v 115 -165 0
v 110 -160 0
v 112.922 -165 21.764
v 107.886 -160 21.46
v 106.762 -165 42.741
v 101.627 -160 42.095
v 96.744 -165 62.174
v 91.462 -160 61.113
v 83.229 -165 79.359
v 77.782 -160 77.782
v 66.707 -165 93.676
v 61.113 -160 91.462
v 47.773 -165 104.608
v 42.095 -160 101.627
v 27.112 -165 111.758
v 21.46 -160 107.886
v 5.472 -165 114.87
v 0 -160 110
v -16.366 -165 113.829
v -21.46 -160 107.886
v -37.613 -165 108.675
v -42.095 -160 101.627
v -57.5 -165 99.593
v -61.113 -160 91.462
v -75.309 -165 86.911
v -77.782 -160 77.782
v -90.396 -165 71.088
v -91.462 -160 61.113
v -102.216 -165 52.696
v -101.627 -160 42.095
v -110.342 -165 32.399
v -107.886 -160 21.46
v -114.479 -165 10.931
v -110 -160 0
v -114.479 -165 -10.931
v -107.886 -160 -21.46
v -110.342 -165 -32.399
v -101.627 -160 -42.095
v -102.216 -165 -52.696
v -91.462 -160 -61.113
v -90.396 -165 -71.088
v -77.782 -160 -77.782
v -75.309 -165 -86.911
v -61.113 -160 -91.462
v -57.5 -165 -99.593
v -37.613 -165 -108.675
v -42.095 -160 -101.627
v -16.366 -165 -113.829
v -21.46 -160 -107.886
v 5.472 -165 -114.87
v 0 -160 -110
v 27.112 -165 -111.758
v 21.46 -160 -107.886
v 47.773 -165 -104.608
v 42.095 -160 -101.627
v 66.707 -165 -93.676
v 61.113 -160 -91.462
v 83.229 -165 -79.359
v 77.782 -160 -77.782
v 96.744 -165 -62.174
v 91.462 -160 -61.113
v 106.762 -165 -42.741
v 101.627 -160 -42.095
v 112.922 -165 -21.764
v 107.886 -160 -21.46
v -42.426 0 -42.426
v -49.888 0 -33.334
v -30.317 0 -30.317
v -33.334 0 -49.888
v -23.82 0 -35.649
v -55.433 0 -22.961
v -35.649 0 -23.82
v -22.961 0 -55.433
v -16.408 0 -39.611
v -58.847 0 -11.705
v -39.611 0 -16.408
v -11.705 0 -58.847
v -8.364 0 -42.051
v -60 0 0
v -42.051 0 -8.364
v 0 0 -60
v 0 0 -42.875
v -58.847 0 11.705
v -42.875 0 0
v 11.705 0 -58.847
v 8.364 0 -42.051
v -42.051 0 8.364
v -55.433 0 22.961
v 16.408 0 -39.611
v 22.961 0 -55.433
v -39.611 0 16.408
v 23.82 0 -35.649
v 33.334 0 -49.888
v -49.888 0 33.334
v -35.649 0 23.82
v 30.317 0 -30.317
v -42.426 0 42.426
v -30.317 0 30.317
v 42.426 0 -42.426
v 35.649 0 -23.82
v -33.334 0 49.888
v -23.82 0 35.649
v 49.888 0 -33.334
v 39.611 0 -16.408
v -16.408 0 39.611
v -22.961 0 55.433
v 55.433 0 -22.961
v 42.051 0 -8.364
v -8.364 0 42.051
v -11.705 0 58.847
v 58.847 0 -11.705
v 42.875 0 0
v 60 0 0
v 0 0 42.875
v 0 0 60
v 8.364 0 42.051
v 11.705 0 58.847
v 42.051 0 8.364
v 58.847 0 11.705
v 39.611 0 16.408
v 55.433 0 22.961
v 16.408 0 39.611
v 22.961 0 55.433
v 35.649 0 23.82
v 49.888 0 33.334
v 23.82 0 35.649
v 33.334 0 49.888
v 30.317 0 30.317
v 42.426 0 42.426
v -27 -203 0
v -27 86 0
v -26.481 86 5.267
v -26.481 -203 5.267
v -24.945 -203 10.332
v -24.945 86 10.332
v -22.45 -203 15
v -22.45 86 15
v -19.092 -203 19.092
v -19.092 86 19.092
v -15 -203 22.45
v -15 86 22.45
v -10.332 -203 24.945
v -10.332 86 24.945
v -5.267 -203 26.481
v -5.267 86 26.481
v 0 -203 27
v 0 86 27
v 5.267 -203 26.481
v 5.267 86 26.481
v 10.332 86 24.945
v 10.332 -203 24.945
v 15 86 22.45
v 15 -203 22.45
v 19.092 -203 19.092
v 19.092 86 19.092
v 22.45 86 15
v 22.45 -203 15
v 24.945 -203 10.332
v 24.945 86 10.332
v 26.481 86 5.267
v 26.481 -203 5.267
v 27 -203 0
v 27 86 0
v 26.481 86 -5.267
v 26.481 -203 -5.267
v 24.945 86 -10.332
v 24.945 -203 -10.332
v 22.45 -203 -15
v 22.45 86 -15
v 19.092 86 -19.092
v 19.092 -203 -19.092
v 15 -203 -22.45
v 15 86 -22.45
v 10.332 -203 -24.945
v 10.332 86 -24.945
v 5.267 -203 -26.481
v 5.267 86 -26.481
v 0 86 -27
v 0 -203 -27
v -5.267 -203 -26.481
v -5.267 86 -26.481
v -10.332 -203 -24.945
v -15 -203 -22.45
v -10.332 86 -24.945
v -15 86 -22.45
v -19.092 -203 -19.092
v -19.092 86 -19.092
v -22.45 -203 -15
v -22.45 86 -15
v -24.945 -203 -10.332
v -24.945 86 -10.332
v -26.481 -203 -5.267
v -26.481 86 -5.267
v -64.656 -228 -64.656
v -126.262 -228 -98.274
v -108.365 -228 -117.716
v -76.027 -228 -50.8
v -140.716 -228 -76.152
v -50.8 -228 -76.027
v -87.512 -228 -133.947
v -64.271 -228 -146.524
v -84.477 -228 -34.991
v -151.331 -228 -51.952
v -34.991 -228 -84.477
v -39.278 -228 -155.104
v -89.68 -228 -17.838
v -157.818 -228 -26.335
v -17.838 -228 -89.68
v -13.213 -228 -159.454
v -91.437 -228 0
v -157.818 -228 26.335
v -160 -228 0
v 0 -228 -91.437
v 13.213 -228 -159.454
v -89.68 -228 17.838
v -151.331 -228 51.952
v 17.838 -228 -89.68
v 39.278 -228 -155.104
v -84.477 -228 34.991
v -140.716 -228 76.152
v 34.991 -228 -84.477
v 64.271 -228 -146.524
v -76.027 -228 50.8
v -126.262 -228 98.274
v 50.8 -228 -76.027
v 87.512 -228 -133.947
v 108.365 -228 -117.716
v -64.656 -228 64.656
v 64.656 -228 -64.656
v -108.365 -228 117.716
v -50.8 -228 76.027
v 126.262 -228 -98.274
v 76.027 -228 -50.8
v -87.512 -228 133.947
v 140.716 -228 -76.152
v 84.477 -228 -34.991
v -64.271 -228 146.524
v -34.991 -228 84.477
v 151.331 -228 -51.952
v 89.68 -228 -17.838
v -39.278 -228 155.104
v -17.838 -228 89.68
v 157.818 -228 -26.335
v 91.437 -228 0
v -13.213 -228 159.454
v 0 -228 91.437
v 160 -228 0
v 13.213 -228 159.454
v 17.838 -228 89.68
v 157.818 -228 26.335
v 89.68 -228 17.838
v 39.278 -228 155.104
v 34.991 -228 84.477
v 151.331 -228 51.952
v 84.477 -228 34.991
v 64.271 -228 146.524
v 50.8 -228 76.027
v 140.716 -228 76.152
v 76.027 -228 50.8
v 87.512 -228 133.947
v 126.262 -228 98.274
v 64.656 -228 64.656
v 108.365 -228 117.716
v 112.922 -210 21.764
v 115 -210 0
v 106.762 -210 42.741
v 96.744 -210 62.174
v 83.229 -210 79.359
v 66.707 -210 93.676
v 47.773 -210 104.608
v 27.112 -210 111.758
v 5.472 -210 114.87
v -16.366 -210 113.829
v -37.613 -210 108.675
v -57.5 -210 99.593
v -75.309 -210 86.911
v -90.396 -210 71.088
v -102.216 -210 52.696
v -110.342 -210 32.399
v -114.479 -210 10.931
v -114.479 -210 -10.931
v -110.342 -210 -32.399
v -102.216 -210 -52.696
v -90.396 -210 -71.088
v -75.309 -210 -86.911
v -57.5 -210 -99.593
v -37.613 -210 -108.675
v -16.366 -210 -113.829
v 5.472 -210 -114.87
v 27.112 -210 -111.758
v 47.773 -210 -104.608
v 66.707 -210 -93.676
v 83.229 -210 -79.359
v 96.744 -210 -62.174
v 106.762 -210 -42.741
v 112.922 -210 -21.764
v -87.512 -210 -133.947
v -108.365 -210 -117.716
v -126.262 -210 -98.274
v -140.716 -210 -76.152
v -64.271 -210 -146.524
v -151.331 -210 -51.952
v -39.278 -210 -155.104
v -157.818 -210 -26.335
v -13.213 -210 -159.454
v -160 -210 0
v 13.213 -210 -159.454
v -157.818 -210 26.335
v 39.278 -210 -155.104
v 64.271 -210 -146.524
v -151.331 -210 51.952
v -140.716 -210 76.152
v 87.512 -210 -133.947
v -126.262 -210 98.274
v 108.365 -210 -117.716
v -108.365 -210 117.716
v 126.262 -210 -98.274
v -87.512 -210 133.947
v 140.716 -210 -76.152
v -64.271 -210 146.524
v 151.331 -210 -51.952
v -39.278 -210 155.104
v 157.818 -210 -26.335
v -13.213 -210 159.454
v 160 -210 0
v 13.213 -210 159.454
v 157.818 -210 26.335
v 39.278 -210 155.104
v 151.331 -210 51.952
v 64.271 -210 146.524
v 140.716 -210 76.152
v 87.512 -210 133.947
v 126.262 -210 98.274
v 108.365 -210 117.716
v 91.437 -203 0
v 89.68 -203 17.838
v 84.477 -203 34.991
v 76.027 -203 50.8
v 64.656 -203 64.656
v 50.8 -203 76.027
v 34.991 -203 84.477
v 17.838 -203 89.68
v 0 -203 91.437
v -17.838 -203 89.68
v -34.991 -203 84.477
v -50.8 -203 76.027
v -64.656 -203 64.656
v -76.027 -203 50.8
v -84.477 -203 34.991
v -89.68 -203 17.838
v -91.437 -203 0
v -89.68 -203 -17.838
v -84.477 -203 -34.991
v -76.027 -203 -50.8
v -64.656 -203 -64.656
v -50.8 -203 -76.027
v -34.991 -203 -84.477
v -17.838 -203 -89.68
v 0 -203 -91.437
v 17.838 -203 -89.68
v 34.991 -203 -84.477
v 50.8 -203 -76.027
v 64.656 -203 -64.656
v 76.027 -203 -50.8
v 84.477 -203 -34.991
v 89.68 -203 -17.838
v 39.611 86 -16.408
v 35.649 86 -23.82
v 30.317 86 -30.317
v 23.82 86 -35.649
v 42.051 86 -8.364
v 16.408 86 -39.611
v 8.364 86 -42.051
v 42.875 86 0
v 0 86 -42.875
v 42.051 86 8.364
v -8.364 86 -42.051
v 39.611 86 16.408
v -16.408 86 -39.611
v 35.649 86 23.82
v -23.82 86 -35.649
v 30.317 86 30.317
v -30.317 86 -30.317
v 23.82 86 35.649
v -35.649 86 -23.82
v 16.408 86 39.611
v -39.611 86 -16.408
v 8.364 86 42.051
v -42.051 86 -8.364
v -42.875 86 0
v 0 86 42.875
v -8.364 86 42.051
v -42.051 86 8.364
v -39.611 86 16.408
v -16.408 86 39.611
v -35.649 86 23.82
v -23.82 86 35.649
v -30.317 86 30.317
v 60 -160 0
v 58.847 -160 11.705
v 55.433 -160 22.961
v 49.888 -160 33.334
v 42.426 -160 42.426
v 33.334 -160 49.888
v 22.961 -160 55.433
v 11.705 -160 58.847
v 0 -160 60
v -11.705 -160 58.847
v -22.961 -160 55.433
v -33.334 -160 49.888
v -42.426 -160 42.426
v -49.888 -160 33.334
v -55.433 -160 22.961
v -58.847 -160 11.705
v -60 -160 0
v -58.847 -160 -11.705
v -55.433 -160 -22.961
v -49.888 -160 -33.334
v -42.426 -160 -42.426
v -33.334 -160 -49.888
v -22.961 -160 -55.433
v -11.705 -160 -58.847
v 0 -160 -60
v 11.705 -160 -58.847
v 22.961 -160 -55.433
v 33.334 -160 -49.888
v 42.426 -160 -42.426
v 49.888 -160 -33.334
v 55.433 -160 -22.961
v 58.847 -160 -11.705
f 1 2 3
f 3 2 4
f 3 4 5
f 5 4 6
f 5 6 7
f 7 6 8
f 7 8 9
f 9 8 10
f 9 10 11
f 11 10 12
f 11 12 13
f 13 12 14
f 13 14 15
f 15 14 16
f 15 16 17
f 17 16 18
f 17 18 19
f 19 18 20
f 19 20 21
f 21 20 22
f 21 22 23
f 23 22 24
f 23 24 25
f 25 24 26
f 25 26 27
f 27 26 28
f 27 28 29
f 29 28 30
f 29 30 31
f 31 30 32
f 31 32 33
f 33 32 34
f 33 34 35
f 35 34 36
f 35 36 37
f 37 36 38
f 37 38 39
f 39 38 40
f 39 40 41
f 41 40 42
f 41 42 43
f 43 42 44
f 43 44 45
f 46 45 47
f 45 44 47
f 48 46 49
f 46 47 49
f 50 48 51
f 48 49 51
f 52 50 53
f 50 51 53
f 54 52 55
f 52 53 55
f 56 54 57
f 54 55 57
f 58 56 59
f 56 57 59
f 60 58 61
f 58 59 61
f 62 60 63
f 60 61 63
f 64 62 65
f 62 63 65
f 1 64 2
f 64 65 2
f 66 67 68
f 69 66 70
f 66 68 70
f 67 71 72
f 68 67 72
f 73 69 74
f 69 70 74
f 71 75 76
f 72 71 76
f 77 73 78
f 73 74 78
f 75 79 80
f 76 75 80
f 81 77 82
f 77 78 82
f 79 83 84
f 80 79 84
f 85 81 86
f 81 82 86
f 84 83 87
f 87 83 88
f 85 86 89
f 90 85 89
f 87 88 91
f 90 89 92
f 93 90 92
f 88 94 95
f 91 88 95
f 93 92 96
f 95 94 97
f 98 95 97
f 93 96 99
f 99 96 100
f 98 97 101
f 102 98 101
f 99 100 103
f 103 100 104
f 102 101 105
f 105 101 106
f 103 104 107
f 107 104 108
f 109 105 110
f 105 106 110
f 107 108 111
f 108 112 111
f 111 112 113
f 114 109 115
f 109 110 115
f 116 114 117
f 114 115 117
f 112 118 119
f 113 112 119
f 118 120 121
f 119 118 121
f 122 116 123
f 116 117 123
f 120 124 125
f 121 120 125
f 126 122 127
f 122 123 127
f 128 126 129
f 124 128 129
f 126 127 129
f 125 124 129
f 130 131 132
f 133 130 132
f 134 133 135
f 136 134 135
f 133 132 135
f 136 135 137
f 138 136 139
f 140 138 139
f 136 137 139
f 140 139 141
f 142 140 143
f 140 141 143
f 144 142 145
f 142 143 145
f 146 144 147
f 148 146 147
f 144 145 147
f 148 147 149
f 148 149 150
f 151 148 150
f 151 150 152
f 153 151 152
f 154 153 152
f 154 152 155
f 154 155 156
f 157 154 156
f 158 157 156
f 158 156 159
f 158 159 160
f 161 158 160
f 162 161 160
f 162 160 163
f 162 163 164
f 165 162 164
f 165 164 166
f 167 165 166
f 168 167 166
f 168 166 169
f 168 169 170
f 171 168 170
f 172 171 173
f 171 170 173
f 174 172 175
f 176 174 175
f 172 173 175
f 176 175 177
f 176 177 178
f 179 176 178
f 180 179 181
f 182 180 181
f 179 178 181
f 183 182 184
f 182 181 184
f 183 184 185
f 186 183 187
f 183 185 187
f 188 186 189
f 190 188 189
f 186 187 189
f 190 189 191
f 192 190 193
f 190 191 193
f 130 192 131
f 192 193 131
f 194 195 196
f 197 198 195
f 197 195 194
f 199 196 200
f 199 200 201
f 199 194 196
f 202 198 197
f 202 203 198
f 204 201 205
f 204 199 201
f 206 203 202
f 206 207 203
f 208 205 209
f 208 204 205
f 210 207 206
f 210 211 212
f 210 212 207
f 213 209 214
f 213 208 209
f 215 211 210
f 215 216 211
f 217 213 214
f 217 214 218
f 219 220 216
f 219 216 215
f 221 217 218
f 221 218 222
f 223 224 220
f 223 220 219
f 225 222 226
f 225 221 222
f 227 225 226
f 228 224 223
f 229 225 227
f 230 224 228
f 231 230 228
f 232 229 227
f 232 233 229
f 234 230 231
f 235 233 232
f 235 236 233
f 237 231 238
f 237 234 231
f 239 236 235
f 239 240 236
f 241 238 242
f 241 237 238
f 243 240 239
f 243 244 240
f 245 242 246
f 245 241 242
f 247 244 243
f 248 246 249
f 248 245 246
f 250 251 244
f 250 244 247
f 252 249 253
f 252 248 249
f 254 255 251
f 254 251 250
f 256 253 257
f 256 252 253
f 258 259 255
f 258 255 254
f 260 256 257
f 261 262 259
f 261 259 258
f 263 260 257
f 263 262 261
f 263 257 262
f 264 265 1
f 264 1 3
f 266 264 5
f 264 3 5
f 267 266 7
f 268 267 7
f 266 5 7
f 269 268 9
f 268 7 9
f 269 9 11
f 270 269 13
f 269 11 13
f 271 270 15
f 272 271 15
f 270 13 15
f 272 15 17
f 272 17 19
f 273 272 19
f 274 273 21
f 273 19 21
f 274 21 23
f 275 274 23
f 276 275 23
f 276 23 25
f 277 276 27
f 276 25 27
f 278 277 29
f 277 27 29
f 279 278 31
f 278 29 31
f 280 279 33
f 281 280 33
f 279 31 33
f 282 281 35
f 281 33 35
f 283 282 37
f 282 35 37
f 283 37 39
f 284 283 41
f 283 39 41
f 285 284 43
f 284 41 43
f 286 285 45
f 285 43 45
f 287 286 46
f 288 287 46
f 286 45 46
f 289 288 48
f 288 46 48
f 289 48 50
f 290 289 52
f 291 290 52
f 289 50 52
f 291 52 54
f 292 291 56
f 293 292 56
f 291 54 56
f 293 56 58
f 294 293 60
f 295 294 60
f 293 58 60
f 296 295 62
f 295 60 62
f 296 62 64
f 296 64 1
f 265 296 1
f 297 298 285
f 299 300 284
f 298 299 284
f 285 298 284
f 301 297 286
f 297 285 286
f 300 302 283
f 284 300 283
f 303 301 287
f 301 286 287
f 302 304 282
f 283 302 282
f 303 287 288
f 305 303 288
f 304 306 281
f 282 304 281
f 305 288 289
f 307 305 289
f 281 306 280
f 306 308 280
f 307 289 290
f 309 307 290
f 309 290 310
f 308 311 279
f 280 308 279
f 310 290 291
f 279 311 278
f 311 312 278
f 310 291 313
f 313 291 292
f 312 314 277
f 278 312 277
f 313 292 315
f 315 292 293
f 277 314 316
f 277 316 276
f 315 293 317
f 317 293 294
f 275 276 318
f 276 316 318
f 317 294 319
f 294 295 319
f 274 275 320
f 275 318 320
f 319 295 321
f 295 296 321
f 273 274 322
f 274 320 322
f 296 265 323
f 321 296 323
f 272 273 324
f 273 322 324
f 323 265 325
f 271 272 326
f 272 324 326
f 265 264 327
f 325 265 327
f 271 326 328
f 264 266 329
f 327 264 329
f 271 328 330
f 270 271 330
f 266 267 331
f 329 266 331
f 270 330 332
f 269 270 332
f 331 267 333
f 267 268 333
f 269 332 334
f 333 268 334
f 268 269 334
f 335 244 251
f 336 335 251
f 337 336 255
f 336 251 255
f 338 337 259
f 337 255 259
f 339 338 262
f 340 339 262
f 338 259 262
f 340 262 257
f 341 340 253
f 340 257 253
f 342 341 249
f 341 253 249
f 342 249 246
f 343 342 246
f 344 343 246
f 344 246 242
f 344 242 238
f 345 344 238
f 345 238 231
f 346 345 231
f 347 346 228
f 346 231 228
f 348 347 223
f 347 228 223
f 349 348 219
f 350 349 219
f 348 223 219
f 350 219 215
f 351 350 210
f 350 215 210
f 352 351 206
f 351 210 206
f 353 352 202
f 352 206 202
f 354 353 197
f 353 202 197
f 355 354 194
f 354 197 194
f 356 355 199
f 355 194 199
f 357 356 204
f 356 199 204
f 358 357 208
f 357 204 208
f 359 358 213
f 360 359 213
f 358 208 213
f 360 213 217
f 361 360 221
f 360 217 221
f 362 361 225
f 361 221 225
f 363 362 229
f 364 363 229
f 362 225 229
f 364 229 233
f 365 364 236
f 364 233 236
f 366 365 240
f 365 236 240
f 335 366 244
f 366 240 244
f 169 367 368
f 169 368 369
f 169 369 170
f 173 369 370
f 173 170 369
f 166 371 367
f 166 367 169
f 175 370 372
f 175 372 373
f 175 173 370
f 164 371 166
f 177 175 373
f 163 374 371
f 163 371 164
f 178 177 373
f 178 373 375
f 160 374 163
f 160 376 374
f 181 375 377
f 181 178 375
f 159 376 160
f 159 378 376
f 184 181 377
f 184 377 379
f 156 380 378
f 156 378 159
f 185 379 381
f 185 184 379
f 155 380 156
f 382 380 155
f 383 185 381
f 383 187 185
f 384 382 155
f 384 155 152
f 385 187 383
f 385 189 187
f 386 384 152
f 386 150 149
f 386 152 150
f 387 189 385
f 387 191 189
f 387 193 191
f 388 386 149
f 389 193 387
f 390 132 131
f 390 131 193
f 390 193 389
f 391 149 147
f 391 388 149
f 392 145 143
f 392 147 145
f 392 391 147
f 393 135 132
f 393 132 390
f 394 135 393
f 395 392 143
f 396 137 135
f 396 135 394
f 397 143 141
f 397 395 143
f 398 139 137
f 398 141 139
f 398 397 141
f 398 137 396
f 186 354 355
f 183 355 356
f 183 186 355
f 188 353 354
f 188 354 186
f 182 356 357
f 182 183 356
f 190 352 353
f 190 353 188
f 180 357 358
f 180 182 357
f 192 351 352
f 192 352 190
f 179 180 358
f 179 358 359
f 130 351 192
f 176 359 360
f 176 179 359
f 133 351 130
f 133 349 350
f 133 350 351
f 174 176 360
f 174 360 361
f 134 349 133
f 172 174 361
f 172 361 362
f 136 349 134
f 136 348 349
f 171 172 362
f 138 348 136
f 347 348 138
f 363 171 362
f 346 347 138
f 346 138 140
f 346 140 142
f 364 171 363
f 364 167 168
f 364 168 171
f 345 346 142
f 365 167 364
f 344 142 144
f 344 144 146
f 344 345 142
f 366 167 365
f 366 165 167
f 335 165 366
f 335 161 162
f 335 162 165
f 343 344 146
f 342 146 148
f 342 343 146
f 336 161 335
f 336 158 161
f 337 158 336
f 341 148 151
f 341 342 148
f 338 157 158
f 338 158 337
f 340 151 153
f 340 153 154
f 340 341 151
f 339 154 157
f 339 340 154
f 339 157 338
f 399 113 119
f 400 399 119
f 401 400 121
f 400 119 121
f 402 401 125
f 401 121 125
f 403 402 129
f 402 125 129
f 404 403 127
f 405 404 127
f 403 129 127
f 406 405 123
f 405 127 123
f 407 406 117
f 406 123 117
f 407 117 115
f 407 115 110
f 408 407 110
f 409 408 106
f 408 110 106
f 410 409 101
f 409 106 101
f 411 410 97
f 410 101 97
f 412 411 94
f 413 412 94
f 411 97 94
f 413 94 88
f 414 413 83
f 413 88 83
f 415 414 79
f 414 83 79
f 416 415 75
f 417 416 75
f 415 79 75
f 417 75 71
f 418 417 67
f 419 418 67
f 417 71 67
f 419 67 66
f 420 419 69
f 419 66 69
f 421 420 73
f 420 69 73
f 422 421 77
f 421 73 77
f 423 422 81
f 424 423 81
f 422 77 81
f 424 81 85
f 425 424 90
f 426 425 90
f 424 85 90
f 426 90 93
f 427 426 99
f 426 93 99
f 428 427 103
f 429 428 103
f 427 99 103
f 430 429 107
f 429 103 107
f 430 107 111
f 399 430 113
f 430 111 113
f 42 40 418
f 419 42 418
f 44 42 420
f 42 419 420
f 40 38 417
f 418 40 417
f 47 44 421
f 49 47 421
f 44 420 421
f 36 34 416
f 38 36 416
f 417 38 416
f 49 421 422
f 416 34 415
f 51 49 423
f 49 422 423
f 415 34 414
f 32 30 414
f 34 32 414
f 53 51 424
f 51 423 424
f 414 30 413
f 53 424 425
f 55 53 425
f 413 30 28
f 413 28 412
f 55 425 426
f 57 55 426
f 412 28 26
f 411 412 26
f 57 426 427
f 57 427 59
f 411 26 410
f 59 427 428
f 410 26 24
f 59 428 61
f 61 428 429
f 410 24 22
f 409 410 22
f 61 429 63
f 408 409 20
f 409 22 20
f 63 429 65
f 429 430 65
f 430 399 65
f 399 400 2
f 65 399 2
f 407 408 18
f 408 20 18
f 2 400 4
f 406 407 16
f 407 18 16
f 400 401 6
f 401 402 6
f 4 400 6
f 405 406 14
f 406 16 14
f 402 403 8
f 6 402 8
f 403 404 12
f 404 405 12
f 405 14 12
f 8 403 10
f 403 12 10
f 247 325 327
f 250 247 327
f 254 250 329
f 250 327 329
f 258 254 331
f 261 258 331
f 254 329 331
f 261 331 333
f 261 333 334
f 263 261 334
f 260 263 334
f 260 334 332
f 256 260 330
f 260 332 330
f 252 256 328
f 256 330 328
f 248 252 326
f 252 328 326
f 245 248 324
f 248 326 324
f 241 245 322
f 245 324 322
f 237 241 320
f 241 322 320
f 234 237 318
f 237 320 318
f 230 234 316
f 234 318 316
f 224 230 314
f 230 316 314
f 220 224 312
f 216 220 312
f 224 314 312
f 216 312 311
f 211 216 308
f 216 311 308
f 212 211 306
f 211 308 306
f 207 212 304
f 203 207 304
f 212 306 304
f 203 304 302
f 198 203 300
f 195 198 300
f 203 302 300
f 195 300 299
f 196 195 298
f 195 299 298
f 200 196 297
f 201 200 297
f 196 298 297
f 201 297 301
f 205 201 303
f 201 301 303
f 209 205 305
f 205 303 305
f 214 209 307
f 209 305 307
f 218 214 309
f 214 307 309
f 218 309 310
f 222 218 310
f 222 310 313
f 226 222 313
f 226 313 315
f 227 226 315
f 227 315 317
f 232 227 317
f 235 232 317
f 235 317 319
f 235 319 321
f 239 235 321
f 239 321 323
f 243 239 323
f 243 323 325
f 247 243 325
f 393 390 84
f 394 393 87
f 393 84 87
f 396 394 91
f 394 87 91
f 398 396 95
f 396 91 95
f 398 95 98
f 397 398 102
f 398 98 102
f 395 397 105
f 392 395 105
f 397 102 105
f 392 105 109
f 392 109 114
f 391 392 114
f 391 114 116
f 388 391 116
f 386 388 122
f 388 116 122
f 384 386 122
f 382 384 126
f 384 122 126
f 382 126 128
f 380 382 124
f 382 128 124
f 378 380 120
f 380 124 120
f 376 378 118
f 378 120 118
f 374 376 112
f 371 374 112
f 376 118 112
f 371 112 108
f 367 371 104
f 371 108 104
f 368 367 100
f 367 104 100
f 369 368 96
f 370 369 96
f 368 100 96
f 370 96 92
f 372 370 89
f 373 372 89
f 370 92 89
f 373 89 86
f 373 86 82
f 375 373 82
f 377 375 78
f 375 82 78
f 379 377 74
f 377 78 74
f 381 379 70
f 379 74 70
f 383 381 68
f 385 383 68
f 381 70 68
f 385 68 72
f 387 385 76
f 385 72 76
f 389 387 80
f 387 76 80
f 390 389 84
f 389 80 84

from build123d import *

# Parameters (mm, degrees)
F0_R      = 60
F1_DEPTH  = 160
F2_R      = 115
F3_DEPTH  = 50
F4_R      = 160
F5_DEPTH  = 18
F6_SIZE   = 5
F7_R      = 42.875
F8_DEPTH  = 86
F9_R      = 27
F10_DEPTH = 430
F11_R     = 91.436725
F12_DEPTH = 25


with BuildPart() as f1:
    # F0 (on Front) → F1 (new body)
    with BuildSketch(Plane.XZ):
        Circle(F0_R)
    extrude(amount=F1_DEPTH)

    # F2 (on face) → F3 (join)
    with BuildSketch(Plane.XZ.offset(160)):
        Circle(F2_R)
    extrude(amount=F3_DEPTH)

    # F4 (on face) → F5 (join)
    with BuildSketch(Plane.XZ.offset(210)):
        Circle(F4_R)
    extrude(amount=F5_DEPTH)

    # F6
    f6_edges = [f1.edges().sort_by_distance(p)[0] for p in [
        (-115, -160, 0),
    ]]
    chamfer(f6_edges, length=F6_SIZE)

    # F7 (on face) → F8 (join)
    with BuildSketch(Plane(origin=(0, 0, 0), x_dir=(-1, 0, 0), z_dir=(0, 1, 0))):
        Circle(F7_R)
    extrude(amount=F8_DEPTH)

    # F9 (on face) → F10 (cut)
    with BuildSketch(Plane(origin=(0, 86, 0), x_dir=(-1, 0, 0), z_dir=(0, 1, 0))):
        Circle(F9_R)
    extrude(amount=-F10_DEPTH, mode=Mode.SUBTRACT)

    # F11 (on face) → F12 (cut)
    with BuildSketch(Plane.XZ.offset(228)):
        Circle(F11_R)
    extrude(amount=-F12_DEPTH, mode=Mode.SUBTRACT)


solid = f1.part
